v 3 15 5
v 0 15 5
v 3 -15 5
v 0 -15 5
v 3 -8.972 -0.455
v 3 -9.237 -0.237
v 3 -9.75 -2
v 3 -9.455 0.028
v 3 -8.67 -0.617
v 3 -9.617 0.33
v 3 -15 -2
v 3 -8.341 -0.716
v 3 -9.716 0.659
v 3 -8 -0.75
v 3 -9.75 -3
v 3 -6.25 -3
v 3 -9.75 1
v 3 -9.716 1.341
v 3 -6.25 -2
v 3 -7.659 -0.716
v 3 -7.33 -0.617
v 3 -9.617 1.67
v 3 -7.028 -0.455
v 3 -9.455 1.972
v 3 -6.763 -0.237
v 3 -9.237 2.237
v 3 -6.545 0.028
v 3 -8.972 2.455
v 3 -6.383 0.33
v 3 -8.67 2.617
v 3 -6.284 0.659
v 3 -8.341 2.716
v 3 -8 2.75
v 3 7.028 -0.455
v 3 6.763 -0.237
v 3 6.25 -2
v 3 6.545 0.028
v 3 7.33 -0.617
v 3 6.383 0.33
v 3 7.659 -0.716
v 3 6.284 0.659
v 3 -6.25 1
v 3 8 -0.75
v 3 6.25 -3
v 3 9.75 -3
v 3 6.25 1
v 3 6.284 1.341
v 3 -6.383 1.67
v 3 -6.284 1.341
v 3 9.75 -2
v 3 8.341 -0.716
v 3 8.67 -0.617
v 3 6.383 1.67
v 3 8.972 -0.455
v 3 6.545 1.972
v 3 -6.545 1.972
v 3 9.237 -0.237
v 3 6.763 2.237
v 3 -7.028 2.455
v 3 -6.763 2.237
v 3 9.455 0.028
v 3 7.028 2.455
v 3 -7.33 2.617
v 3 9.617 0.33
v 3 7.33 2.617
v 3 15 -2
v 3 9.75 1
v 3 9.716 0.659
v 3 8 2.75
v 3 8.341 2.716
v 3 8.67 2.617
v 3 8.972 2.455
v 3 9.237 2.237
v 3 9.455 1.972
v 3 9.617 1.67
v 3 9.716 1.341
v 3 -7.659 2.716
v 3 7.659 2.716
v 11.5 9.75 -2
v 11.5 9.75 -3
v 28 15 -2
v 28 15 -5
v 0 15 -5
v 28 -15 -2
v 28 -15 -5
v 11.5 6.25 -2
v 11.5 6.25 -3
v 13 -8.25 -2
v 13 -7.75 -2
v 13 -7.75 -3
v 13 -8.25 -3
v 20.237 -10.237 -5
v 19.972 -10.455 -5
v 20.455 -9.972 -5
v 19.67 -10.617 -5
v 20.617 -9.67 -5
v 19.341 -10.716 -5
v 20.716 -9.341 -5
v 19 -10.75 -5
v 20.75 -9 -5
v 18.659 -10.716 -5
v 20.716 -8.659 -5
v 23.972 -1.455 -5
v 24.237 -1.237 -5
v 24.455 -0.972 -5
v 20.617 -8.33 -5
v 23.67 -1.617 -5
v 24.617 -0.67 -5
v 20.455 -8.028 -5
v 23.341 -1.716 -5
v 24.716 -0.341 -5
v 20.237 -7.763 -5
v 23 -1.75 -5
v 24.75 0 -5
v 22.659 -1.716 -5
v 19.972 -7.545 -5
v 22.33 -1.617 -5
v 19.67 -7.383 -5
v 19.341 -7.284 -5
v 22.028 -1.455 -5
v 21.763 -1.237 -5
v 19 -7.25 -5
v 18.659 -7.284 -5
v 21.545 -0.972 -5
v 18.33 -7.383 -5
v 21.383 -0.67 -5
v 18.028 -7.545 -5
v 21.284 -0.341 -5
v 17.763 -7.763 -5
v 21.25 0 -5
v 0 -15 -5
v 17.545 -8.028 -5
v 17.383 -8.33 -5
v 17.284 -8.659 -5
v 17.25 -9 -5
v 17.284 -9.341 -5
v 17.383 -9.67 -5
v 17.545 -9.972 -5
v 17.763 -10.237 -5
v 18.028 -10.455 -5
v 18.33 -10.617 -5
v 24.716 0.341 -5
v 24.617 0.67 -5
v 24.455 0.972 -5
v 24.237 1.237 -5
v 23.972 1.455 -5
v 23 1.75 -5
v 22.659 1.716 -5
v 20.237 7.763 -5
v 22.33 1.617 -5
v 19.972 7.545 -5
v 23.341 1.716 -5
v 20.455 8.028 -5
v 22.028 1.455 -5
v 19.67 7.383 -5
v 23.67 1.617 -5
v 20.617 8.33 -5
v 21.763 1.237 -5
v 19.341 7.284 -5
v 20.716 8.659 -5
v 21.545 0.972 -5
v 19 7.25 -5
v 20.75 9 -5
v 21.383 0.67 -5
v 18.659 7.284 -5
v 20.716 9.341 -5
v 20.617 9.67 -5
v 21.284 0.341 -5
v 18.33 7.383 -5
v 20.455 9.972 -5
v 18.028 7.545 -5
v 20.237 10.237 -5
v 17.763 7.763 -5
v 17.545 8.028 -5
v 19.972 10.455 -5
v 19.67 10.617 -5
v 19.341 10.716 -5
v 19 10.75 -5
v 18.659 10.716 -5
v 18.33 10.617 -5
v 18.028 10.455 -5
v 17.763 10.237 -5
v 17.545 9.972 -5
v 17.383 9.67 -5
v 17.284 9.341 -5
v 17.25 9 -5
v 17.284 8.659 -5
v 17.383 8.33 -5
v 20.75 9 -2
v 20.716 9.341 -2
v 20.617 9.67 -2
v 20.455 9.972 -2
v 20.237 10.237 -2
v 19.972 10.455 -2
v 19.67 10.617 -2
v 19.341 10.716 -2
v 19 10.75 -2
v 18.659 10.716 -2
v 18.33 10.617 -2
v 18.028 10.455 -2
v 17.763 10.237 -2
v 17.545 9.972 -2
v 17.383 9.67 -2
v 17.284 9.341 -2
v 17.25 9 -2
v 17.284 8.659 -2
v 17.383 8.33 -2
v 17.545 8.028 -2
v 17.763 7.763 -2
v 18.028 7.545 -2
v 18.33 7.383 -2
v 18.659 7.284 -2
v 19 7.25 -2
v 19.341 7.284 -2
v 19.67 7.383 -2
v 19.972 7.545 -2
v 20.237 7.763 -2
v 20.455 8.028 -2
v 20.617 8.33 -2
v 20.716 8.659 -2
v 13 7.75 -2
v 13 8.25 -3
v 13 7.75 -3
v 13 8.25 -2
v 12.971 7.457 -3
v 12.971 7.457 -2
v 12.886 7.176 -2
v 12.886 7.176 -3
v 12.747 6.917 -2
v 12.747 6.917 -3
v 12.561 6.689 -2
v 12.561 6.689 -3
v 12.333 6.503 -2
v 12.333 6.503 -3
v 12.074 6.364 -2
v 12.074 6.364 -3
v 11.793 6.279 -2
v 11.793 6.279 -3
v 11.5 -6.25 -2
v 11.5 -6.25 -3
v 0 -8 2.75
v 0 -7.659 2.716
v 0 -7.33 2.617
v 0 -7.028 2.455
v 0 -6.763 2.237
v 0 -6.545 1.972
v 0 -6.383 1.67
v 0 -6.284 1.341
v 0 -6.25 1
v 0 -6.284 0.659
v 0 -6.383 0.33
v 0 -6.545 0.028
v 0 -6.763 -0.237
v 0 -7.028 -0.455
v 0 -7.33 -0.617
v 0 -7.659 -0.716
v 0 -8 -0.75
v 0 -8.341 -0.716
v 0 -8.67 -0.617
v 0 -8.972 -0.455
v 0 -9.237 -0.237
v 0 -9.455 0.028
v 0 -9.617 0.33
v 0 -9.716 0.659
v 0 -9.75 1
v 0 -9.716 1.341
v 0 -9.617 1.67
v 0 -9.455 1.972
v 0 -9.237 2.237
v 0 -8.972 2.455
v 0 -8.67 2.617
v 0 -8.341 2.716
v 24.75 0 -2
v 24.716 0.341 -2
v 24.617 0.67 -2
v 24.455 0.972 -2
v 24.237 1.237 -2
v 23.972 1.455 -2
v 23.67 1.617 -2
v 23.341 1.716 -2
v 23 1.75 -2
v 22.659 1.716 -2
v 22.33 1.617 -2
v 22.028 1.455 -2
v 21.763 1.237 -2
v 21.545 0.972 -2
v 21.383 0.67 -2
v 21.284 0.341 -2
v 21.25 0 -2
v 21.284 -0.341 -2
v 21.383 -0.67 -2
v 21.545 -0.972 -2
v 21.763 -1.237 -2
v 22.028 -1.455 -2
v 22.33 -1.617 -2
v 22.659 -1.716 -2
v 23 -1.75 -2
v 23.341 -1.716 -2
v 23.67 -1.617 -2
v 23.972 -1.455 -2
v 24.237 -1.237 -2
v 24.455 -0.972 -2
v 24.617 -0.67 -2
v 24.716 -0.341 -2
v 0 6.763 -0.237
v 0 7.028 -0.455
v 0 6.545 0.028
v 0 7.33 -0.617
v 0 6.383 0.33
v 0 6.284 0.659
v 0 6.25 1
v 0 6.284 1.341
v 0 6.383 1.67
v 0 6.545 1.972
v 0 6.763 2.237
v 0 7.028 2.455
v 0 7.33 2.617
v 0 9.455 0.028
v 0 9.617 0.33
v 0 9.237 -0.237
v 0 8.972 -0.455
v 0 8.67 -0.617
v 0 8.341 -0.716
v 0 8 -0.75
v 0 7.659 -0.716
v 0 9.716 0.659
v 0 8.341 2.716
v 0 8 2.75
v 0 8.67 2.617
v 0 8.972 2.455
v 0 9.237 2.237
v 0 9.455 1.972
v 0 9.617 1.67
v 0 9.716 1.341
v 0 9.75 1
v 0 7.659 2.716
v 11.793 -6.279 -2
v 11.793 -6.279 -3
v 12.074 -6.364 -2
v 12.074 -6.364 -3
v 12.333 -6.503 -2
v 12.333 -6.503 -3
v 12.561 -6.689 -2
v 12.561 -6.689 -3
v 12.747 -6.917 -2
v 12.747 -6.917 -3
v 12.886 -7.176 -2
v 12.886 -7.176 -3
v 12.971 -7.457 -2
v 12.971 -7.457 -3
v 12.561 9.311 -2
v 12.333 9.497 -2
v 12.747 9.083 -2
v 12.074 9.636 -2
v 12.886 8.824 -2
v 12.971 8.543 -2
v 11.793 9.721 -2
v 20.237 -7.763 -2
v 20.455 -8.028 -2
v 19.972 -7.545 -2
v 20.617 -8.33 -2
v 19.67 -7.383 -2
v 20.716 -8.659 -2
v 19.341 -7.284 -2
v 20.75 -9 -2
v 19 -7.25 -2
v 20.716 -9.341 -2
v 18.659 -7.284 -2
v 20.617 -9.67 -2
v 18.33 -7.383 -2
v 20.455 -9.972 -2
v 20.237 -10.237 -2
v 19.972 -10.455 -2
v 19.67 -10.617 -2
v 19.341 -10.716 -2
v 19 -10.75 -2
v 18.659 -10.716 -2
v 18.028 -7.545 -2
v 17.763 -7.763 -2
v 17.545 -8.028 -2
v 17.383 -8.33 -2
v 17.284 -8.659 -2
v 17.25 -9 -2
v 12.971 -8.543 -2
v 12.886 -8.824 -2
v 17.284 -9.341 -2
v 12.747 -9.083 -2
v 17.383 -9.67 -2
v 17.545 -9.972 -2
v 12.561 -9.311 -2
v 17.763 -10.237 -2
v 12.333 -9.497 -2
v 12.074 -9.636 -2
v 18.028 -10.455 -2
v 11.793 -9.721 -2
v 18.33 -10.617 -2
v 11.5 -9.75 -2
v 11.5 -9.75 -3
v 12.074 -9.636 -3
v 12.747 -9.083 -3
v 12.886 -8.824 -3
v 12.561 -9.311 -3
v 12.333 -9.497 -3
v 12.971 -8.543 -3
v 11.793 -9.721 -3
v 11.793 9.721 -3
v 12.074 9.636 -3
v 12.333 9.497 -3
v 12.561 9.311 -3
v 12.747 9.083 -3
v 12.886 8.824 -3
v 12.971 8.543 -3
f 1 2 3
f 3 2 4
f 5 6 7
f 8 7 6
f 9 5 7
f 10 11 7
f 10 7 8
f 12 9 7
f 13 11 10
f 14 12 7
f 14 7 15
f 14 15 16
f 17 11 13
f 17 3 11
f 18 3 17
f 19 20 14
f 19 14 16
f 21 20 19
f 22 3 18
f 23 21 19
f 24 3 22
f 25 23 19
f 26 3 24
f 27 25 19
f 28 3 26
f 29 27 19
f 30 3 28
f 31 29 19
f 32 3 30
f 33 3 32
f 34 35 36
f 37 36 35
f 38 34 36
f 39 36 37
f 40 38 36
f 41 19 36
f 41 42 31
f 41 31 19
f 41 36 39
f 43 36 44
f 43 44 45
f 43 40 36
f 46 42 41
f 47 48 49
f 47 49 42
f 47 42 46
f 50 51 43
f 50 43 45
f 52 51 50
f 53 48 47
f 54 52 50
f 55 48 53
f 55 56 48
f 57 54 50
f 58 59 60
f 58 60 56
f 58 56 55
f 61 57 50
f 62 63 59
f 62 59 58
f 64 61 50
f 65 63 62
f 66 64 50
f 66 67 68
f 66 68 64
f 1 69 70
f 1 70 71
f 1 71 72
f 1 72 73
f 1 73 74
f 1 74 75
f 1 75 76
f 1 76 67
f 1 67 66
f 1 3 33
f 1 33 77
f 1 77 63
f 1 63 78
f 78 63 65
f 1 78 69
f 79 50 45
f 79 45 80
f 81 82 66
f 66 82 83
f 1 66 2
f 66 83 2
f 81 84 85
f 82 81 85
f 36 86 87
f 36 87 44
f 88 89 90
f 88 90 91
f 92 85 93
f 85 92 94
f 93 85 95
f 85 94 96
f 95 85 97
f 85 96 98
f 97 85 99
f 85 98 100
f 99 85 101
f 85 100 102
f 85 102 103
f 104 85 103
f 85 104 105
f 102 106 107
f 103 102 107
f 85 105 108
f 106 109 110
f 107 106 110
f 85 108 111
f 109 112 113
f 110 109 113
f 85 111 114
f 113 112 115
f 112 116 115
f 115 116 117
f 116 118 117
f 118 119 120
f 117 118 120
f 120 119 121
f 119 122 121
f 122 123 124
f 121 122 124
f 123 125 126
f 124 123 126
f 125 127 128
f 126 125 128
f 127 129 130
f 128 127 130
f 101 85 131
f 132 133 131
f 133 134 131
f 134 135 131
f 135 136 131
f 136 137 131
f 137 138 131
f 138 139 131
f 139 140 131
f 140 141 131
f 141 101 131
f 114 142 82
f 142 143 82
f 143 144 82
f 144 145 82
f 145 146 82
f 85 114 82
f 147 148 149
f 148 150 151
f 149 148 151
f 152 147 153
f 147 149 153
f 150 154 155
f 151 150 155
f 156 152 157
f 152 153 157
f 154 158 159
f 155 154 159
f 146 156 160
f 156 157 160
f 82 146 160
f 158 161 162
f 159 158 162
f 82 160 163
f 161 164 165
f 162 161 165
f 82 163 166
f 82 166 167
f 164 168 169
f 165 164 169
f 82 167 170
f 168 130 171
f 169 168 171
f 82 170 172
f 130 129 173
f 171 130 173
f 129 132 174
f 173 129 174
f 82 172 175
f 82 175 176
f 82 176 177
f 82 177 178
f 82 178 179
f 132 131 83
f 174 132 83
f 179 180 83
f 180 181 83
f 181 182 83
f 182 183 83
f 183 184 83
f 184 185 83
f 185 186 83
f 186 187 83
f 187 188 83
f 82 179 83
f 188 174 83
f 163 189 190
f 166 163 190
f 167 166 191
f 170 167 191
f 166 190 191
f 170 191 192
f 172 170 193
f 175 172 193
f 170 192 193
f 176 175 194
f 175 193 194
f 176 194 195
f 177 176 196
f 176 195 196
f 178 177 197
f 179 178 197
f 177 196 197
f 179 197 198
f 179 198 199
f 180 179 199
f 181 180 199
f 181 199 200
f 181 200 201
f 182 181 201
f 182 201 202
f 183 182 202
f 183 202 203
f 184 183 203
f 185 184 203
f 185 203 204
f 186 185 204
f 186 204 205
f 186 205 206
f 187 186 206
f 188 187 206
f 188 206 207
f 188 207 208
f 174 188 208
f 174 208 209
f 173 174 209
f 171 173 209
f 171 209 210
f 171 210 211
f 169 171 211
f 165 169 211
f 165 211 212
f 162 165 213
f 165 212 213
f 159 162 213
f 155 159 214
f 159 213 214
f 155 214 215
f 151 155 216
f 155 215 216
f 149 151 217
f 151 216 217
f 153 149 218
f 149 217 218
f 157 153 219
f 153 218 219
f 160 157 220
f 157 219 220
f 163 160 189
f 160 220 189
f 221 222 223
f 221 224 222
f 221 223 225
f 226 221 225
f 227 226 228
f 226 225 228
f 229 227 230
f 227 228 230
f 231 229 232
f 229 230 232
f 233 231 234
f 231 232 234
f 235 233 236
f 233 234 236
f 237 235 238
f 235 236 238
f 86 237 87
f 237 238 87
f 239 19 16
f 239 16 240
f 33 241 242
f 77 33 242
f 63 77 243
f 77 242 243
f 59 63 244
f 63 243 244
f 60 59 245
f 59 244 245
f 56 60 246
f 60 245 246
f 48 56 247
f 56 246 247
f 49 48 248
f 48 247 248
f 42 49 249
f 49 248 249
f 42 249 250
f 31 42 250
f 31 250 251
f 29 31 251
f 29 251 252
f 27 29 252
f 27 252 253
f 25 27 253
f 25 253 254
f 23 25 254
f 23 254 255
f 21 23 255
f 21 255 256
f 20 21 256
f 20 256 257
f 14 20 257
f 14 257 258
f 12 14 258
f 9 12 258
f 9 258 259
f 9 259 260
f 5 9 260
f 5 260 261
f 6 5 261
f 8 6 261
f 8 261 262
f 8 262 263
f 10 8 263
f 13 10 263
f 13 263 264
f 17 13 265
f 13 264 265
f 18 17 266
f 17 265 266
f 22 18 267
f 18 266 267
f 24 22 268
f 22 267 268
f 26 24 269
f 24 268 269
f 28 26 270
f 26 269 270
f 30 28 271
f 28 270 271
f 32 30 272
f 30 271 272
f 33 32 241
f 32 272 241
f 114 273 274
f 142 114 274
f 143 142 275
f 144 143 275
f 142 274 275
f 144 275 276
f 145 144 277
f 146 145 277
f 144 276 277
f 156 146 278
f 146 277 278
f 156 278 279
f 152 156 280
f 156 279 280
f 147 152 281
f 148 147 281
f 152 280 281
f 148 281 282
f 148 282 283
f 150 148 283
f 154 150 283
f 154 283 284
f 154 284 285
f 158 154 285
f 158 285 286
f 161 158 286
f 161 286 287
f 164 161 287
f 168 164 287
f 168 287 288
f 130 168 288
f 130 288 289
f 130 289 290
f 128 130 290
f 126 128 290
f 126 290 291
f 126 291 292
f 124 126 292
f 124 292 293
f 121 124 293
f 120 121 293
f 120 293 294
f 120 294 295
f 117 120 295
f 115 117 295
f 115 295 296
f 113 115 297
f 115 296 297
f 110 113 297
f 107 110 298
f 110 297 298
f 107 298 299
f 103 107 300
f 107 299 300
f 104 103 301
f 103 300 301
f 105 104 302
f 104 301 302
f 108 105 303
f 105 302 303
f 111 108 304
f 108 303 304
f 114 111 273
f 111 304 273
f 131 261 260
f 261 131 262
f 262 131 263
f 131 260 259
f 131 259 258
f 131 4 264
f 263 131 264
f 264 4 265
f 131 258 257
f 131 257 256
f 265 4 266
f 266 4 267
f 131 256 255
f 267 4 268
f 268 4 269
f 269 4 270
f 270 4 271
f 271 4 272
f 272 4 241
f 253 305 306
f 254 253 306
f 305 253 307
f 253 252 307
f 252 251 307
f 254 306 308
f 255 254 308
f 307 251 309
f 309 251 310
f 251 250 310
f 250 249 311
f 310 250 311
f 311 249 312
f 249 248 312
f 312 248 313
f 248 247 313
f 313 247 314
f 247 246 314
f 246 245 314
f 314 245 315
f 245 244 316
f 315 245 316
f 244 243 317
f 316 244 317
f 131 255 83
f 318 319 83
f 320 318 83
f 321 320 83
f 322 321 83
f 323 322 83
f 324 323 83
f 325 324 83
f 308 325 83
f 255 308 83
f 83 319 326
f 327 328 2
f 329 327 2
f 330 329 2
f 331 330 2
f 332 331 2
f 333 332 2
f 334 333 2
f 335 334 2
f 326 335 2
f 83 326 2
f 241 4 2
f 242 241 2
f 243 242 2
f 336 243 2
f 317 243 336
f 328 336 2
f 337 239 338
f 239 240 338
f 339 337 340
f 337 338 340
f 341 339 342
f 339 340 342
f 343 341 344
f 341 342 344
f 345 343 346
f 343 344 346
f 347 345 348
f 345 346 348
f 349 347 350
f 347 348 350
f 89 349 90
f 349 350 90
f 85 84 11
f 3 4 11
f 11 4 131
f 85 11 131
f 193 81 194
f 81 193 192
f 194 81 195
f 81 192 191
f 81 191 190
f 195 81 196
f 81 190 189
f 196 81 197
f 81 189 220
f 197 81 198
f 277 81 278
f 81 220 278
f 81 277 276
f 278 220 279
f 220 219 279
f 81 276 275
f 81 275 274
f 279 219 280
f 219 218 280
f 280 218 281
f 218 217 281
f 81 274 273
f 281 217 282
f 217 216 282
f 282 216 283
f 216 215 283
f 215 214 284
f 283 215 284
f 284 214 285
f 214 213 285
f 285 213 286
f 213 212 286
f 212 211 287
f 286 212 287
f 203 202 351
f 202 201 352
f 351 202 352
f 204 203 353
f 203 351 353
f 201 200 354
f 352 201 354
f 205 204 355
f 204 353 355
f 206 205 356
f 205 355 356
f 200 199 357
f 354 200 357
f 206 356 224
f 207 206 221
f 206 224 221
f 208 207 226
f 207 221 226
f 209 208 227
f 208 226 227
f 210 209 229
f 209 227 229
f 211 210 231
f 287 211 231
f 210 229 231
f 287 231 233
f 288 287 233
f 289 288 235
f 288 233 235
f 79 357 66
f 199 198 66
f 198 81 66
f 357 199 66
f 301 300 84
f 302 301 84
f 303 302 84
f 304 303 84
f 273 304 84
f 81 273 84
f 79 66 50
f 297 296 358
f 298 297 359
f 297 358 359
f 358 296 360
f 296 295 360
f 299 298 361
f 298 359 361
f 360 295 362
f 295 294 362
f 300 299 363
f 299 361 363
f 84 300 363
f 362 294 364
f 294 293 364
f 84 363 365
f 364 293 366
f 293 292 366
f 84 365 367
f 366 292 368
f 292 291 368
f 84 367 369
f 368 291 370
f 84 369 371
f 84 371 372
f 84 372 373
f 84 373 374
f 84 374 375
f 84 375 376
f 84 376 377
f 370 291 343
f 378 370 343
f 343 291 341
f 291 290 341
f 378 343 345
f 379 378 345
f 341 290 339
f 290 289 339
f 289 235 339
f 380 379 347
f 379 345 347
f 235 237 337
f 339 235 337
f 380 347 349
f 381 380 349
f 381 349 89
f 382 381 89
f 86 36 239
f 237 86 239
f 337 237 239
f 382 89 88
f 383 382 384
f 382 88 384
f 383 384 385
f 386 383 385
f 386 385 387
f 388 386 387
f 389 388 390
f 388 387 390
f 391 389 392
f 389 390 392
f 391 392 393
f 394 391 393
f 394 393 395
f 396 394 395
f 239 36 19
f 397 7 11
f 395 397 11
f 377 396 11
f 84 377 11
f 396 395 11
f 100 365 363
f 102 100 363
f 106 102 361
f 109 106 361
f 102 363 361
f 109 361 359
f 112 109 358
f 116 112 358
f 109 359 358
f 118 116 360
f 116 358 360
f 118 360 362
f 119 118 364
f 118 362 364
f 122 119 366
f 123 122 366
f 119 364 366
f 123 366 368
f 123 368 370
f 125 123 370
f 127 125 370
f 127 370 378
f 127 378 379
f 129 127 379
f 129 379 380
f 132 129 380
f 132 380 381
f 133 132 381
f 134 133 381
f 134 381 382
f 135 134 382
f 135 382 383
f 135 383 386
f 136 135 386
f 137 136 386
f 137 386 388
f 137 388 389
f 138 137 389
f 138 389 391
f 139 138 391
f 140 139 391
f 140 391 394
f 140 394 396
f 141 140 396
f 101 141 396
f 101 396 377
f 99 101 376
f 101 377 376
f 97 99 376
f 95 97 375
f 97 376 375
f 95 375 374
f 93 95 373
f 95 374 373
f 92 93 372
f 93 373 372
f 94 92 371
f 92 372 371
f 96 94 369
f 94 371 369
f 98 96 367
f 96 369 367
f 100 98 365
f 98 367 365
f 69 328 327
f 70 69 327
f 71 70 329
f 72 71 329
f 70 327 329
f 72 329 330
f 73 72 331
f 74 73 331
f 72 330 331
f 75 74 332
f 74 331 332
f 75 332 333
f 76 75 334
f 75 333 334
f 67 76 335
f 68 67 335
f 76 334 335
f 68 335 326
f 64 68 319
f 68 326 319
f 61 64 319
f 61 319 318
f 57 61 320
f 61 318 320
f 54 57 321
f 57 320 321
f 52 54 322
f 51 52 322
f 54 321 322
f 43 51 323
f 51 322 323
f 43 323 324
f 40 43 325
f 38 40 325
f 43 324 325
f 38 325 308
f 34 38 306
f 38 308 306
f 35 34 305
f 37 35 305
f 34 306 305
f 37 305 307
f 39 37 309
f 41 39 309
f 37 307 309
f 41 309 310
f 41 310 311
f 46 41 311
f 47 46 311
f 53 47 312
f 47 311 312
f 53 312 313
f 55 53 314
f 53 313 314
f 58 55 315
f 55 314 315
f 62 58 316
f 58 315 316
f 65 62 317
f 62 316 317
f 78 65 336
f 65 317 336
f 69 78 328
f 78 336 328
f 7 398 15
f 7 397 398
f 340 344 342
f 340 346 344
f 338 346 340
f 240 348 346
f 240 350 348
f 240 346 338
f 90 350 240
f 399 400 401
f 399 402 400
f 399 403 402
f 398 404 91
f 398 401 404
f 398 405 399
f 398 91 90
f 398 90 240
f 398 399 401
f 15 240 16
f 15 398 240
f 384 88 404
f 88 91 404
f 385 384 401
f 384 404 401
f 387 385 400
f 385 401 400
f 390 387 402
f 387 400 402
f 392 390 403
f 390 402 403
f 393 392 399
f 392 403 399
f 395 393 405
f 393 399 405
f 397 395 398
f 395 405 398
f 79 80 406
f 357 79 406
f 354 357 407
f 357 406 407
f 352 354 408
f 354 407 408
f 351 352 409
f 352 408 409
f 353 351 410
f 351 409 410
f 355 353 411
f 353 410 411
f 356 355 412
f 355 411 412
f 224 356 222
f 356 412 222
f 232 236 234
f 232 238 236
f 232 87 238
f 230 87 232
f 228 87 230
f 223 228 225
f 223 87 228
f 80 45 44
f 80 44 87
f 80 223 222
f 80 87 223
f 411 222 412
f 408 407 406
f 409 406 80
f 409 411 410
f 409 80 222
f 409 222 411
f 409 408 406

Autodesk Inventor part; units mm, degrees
ref_plane "YZ Plane" through (0, 0, 0) normal (1, 0, 0) x (0, 1, 0)
ref_plane "XZ Plane" through (0, 0, 0) normal (0, 1, 0) x (-1, 0, 0)
ref_plane "XY Plane" through (0, 0, 0) normal (0, 0, 1) x (1, 0, 0)
sketch "Sketch1" plane through (0, 0, 0) normal (1, 0, 0) x (0, 1, 0)
  point P0 (0, 0)
sketch "Sketch2" plane through (0, 0, 0) normal (1, 0, 0) x (0, 1, 0)
  line L0 (15, 5) -> (-15, 5)
  line L1 (-15, 5) -> (-15, -5)
  line L2 (-15, -5) -> (15, -5)
  line L3 (15, -5) -> (15, 5)
  point P0 (0, 0)
  dimension "d0" = 10
  dimension "d1" = 30
  dimension "d2" = 15
  dimension "d3" = 5
extrude "Extrusion1" add sketch "Sketch2" along normal blind 3
sketch "Sketch3" plane through (3, 0, 0) normal (1, 0, 0) x (0, 0, -1)
  line L0 (5, -15) -> (5, 15) projected
  line L1 (-5, -15) -> (5, -15) projected
  line L2 (5, 15) -> (2, 15)
  line L3 (2, 15) -> (2, -15)
  line L4 (2, -15) -> (5, -15)
  line L5 (5, -15) -> (5, 15)
  dimension "d16" = 3
sketch "Sketch4" plane through (0, 0, 0) normal (-1, 0, 0) x (0, 0, 1)
  circle A0 centre (1, 8) radius 1.75
  line L0 (5, 15) -> (5, -15) projected
  line L1 (-5, 15) -> (5, 15) projected
  dimension "d19" = 4
  dimension "d23" = 3.5
  dimension "d27" = 7
extrude "Extrusion4" add sketch "Sketch3" along normal blind 25
extrude "Extrusion5" cut sketch "Sketch4" against normal blind 25
mirror "Mirror1" about plane through (0, 0, 0) normal (0, 1, 0) of "Extrusion5"
sketch "Sketch5" plane through (3, -15, -2) normal (0, 0, 1) x (1, 0, 0)
  line L0 (0, 30) -> (0, 0) projected
  line L1 (0, 24.75) -> (10, 24.75)
  line L2 (10, 24.75) -> (10, 21.25)
  line L3 (10, 21.25) -> (0, 21.25)
  line L4 (0, 21.25) -> (0, 24.75)
  line L5 (0, 30) -> (25, 30) projected
  point P0 (-3, 15)
  point P1 (0, 21.25)
  dimension "d24" = 5.25
  dimension "d25" = 3.5
  dimension "d26" = 10
extrude "Extrusion6" cut sketch "Sketch5" against normal blind 1
fillet "Fillet2" radius 1.5 2 edges at (13, 9.75, -2.5) (13, 6.25, -2.5)
mirror "Mirror2" about plane through (0, 0, 0) normal (0, 1, 0) of "Extrusion6", "Fillet2"
sketch "Sketch6" plane through (3, -15, -2) normal (0, 0, 1) x (1, 0, 0)
  circle A0 centre (16, 24) radius 1.75
  circle A1 centre (20, 15) radius 1.75
  circle A2 centre (16, 6) radius 1.75
  line L0 (0, 30) -> (25, 30) projected
  line L1 (0, 0) -> (25, 0) projected
  line L2 (0, 30) -> (0, 0) projected
  line L3 (25, 30) -> (25, 0) projected
  point P0 (-3, 15)
  dimension "d31" = 3.5
  dimension "d32" = 3.5
  dimension "d33" = 3.5
  dimension "d34" = 6
  dimension "d35" = 6
  dimension "d36" = 15
  dimension "d40" = 9
  dimension "d41" = 5
  dimension "d42" = 9
extrude "Extrusion7" cut sketch "Sketch6" against normal blind 9 contours A0 | A1 | A2
properties part number "POUPLY_P4_V3"
